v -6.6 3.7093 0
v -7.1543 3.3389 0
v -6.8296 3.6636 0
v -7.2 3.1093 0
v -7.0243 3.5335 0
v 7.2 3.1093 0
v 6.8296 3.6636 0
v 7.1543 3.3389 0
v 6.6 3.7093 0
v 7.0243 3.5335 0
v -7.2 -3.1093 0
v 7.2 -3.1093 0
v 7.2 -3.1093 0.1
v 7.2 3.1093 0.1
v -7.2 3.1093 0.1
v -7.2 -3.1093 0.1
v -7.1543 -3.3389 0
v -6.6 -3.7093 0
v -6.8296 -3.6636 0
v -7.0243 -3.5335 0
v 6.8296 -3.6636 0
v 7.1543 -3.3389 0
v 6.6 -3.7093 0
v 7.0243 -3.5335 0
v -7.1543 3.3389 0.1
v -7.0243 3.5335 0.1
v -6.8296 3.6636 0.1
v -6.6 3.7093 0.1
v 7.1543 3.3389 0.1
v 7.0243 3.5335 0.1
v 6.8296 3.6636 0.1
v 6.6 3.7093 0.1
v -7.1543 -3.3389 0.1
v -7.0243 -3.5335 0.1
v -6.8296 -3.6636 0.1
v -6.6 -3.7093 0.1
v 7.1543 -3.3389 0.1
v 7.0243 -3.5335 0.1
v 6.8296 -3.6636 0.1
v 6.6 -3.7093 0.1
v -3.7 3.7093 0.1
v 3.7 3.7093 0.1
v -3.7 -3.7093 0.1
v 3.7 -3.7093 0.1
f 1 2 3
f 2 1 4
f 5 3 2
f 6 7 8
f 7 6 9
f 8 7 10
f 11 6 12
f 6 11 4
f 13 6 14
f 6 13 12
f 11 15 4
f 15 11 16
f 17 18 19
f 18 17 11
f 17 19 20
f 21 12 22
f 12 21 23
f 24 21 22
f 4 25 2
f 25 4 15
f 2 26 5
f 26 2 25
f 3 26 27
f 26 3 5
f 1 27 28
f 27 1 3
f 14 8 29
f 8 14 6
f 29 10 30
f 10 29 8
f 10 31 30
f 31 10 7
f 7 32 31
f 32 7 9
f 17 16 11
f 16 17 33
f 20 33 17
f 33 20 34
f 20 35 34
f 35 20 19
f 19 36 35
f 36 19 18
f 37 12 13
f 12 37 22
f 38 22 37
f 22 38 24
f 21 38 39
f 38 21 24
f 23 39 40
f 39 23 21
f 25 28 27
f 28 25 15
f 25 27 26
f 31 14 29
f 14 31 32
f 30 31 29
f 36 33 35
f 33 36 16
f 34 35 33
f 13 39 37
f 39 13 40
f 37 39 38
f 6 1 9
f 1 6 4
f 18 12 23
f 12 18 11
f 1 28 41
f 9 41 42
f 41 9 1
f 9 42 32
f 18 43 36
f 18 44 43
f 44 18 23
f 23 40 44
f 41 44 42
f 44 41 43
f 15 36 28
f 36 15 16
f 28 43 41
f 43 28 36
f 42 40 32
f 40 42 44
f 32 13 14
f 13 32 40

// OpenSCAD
// file: ../p/box3u12.scad
use <../lib.scad>
function ldraw_lib__box3u12() = [
// 0 Box with 3 Parallel Faces without Any Edges
// 0 Name: box3u12.dat
// 0 Author: J.C. Tchang [tchang]
// 0 !LDRAW_ORG Primitive UPDATE 2014-02
// 0 !LICENSE Licensed under CC BY 2.0 and CC BY 4.0 : see CAreadme.txt
// 
// 0 BFC CERTIFY CCW
  [0,"BFC","CERTIFY"],
  [0,"BFC","CCW"],
// 
// 0 !HISTORY 2014-12-23 [PTadmin] Official Update 2014-02
// 
// 
// 4 16 -1 1 1 1 1 1 1 1 -1 -1 1 -1
  [4,16,-1,1,1,1,1,1,1,1,-1,-1,1,-1],
// 4 16 -1 1 1 -1 0 1 1 0 1 1 1 1
  [4,16,-1,1,1,-1,0,1,1,0,1,1,1,1],
// 4 16 1 1 -1 1 0 -1 -1 0 -1 -1 1 -1
  [4,16,1,1,-1,1,0,-1,-1,0,-1,-1,1,-1],
];
module ldraw_lib__box3u12(step=0, col=false, unit=2/5, alt=false, line=0.2, solid=!$preview)
    makepoly(ldraw_lib__box3u12(), step=step, col=col, unit=unit, alt=alt, line=line, solid=solid);
ldraw_lib__box3u12(line=0.2);
// file: ../p/1-4cyli.scad
use <../lib.scad>
function ldraw_lib__1_4cyli() = [
// 0 Cylinder 0.25
// 0 Name: 1-4cyli.dat
// 0 Author: James Jessiman
// 0 !LDRAW_ORG Primitive UPDATE 2012-01
// 0 !LICENSE Licensed under CC BY 2.0 and CC BY 4.0 : see CAreadme.txt
// 
// 0 BFC CERTIFY CCW
  [0,"BFC","CERTIFY"],
  [0,"BFC","CCW"],
// 
// 0 !HISTORY 2002-03-23 [sbliss] Added BFC statement.
// 0 !HISTORY 2002-04-25 [PTadmin] Official Update 2002-02
// 0 !HISTORY 2007-06-22 [PTadmin] Header formatted for Contributor Agreement
// 0 !HISTORY 2008-07-01 [PTadmin] Official Update 2008-01
// 0 !HISTORY 2012-02-16 [Philo] Changed to CCW
// 0 !HISTORY 2012-03-30 [PTadmin] Official Update 2012-01
// 
// 
// 4 16 1 1 0 0.9239 1 0.3827 0.9239 0 0.3827 1 0 0
  [4,16,1,1,0,0.9239,1,0.3827,0.9239,0,0.3827,1,0,0],
// 5 24 1 0 0 1 1 0 0.9239 0 0.3827 1 0 -1
  [5,24,1,0,0,1,1,0,0.9239,0,0.3827,1,0,-1],
// 4 16 0.9239 1 0.3827 0.7071 1 0.7071 0.7071 0 0.7071 0.9239 0 0.3827
  [4,16,0.9239,1,0.3827,0.7071,1,0.7071,0.7071,0,0.7071,0.9239,0,0.3827],
// 5 24 0.9239 0 0.3827 0.9239 1 0.3827 0.7071 0 0.7071 1 0 0
  [5,24,0.9239,0,0.3827,0.9239,1,0.3827,0.7071,0,0.7071,1,0,0],
// 4 16 0.7071 1 0.7071 0.3827 1 0.9239 0.3827 0 0.9239 0.7071 0 0.7071
  [4,16,0.7071,1,0.7071,0.3827,1,0.9239,0.3827,0,0.9239,0.7071,0,0.7071],
// 5 24 0.7071 0 0.7071 0.7071 1 0.7071 0.3827 0 0.9239 0.9239 0 0.3827
  [5,24,0.7071,0,0.7071,0.7071,1,0.7071,0.3827,0,0.9239,0.9239,0,0.3827],
// 4 16 0.3827 1 0.9239 0 1 1 0 0 1 0.3827 0 0.9239
  [4,16,0.3827,1,0.9239,0,1,1,0,0,1,0.3827,0,0.9239],
// 5 24 0.3827 0 0.9239 0.3827 1 0.9239 0 0 1 0.7071 0 0.7071
  [5,24,0.3827,0,0.9239,0.3827,1,0.9239,0,0,1,0.7071,0,0.7071],
// 5 24 0 0 1 0 1 1 0.3827 0 0.9239 -1 0 1
  [5,24,0,0,1,0,1,1,0.3827,0,0.9239,-1,0,1],
];
module ldraw_lib__1_4cyli(step=0, col=false, unit=2/5, alt=false, line=0.2, solid=!$preview)
    makepoly(ldraw_lib__1_4cyli(), step=step, col=col, unit=unit, alt=alt, line=line, solid=solid);
ldraw_lib__1_4cyli(line=0.2);
// file: ../p/1-4chrd.scad
use <../lib.scad>
function ldraw_lib__1_4chrd() = [
// 0 Chord 0.25
// 0 Name: 1-4chrd.dat
// 0 Author: Tony Hafner [hafhead]
// 0 !LDRAW_ORG Primitive UPDATE 2012-02
// 0 !LICENSE Licensed under CC BY 2.0 and CC BY 4.0 : see CAreadme.txt
// 
// 0 BFC CERTIFY CCW
  [0,"BFC","CERTIFY"],
  [0,"BFC","CCW"],
// 
// 0 !HISTORY 2004-04-22 [PTadmin] Official Update 2004-02
// 0 !HISTORY 2007-10-09 [PTadmin] Header formatted for Contributor Agreement
// 0 !HISTORY 2008-07-01 [PTadmin] Official Update 2008-01
// 0 !HISTORY 2012-08-02 [MMR1988] Re-creation with PrimGen2 and Rectifier
// 0 !HISTORY 2012-08-09 [PTadmin] Official Update 2012-02
// 
// 
// 4 16 0.9239 0 0.3827 0.3827 0 0.9239 0 0 1 1 0 0
  [4,16,0.9239,0,0.3827,0.3827,0,0.9239,0,0,1,1,0,0],
// 3 16 0.7071 0 0.7071 0.3827 0 0.9239 0.9239 0 0.3827
  [3,16,0.7071,0,0.7071,0.3827,0,0.9239,0.9239,0,0.3827],
];
module ldraw_lib__1_4chrd(step=0, col=false, unit=2/5, alt=false, line=0.2, solid=!$preview)
    makepoly(ldraw_lib__1_4chrd(), step=step, col=col, unit=unit, alt=alt, line=line, solid=solid);
ldraw_lib__1_4chrd(line=0.2);
// main file
use <../lib.scad>
use <../p/1-4chrd.scad>
use <../p/1-4cyli.scad>
use <../p/box3u12.scad>
function ldraw_lib__6142617c() = [
// 0 Sticker  0.9 x  1.8 with Black Stripe on White Background
// 0 Name: 6142617c.dat
// 0 Author: Massimo Maso [Sirio]
// 0 !LDRAW_ORG Part UPDATE 2022-04
// 0 !LICENSE Licensed under CC BY 2.0 and CC BY 4.0 : see CAreadme.txt
// 
// 0 BFC CERTIFY CCW
  [0,"BFC","CERTIFY"],
  [0,"BFC","CCW"],
// 
// 0 !KEYWORDS 1969, Camaro, Chevrolet, Drag, Race, Set 75874, Speed Champions
// 0 !KEYWORDS Z/28
// 
// 0 !HISTORY 2022-07-18 [PTadmin] Official Update 2022-04
// 
// 
// 0 // Primitives
// 
// 1 16 -16.5 0 7.7732 -1.5 0 0 0 -1 0 0 0 1.5 1-4chrd.dat
  [1,16,-16.5,0,7.7732,-1.5,0,0,0,-1,0,0,0,1.5, ldraw_lib__1_4chrd()],
// 1 16 16.5 0 7.7732 1.5 0 0 0 -1 0 0 0 1.5 1-4chrd.dat
  [1,16,16.5,0,7.7732,1.5,0,0,0,-1,0,0,0,1.5, ldraw_lib__1_4chrd()],
// 1 16 0 -.25 0 0 0 18 0 .25 0 7.7732 0 0 box3u12.dat
  [1,16,0,-.25,0,0,0,18,0,.25,0,7.7732,0,0, ldraw_lib__box3u12()],
// 1 16 -16.5 0 -7.7732 -1.5 0 0 0 -1 0 0 0 -1.5 1-4chrd.dat
  [1,16,-16.5,0,-7.7732,-1.5,0,0,0,-1,0,0,0,-1.5, ldraw_lib__1_4chrd()],
// 1 16 16.5 0 -7.7732 1.5 0 0 0 -1 0 0 0 -1.5 1-4chrd.dat
  [1,16,16.5,0,-7.7732,1.5,0,0,0,-1,0,0,0,-1.5, ldraw_lib__1_4chrd()],
// 1 16 -16.5 0 7.7732 -1.5 0 0 0 -.25 0 0 0 1.5 1-4cyli.dat
  [1,16,-16.5,0,7.7732,-1.5,0,0,0,-.25,0,0,0,1.5, ldraw_lib__1_4cyli()],
// 1 16 16.5 0 7.7732 1.5 0 0 0 -.25 0 0 0 1.5 1-4cyli.dat
  [1,16,16.5,0,7.7732,1.5,0,0,0,-.25,0,0,0,1.5, ldraw_lib__1_4cyli()],
// 1 16 -16.5 0 -7.7732 -1.5 0 0 0 -.25 0 0 0 -1.5 1-4cyli.dat
  [1,16,-16.5,0,-7.7732,-1.5,0,0,0,-.25,0,0,0,-1.5, ldraw_lib__1_4cyli()],
// 1 16 16.5 0 -7.7732 1.5 0 0 0 -.25 0 0 0 -1.5 1-4cyli.dat
  [1,16,16.5,0,-7.7732,1.5,0,0,0,-.25,0,0,0,-1.5, ldraw_lib__1_4cyli()],
// 1 15 -16.5 -.25 7.7732 -1.5 0 0 0 1 0 0 0 1.5 1-4chrd.dat
  [1,15,-16.5,-.25,7.7732,-1.5,0,0,0,1,0,0,0,1.5, ldraw_lib__1_4chrd()],
// 1 15 16.5 -.25 7.7732 1.5 0 0 0 1 0 0 0 1.5 1-4chrd.dat
  [1,15,16.5,-.25,7.7732,1.5,0,0,0,1,0,0,0,1.5, ldraw_lib__1_4chrd()],
// 1 15 -16.5 -.25 -7.7732 -1.5 0 0 0 1 0 0 0 -1.5 1-4chrd.dat
  [1,15,-16.5,-.25,-7.7732,-1.5,0,0,0,1,0,0,0,-1.5, ldraw_lib__1_4chrd()],
// 1 15 16.5 -.25 -7.7732 1.5 0 0 0 1 0 0 0 -1.5 1-4chrd.dat
  [1,15,16.5,-.25,-7.7732,1.5,0,0,0,1,0,0,0,-1.5, ldraw_lib__1_4chrd()],
// 0 // Bottom face
// 4 16 16.5 0 9.2732 18 0 7.7732 -18 0 7.7732 -16.5 0 9.2732
  [4,16,16.5,0,9.2732,18,0,7.7732,-18,0,7.7732,-16.5,0,9.2732],
// 4 16 16.5 0 -9.2732 -16.5 0 -9.2732 -18 0 -7.7732 18 0 -7.7732
  [4,16,16.5,0,-9.2732,-16.5,0,-9.2732,-18,0,-7.7732,18,0,-7.7732],
// 0 // Lateral face
// 3 16 -16.5 0 9.2732 -16.5 -.25 9.2732 -9.25 -.25 9.2732
  [3,16,-16.5,0,9.2732,-16.5,-.25,9.2732,-9.25,-.25,9.2732],
// 4 16 -16.5 0 9.2732 -9.25 -.25 9.2732 9.25 -.25 9.2732 16.5 0 9.2732
  [4,16,-16.5,0,9.2732,-9.25,-.25,9.2732,9.25,-.25,9.2732,16.5,0,9.2732],
// 3 16 16.5 0 9.2732 9.25 -.25 9.2732 16.5 -.25 9.2732
  [3,16,16.5,0,9.2732,9.25,-.25,9.2732,16.5,-.25,9.2732],
// 3 16 -16.5 0 -9.2732 -9.25 -.25 -9.2732 -16.5 -.25 -9.2732
  [3,16,-16.5,0,-9.2732,-9.25,-.25,-9.2732,-16.5,-.25,-9.2732],
// 4 16 -16.5 0 -9.2732 16.5 0 -9.2732 9.25 -.25 -9.2732 -9.25 -.25 -9.2732
  [4,16,-16.5,0,-9.2732,16.5,0,-9.2732,9.25,-.25,-9.2732,-9.25,-.25,-9.2732],
// 3 16 16.5 0 -9.2732 16.5 -.25 -9.2732 9.25 -.25 -9.2732
  [3,16,16.5,0,-9.2732,16.5,-.25,-9.2732,9.25,-.25,-9.2732],
// 0 // Top face
// 0 // Black face
// 4 0 -9.25 -.25 9.2732 -9.25 -.25 -9.2732 9.25 -.25 -9.2732 9.25 -.25 9.2732
  [4,0,-9.25,-.25,9.2732,-9.25,-.25,-9.2732,9.25,-.25,-9.2732,9.25,-.25,9.2732],
// 0 // White faces
// 4 15 -16.5 -.25 9.2732 -18 -.25 7.7732 -18 -.25 -7.7732 -16.5 -.25 -9.2732
  [4,15,-16.5,-.25,9.2732,-18,-.25,7.7732,-18,-.25,-7.7732,-16.5,-.25,-9.2732],
// 4 15 -16.5 -.25 9.2732 -16.5 -.25 -9.2732 -9.25 -.25 -9.2732 -9.25 -.25 9.2732
  [4,15,-16.5,-.25,9.2732,-16.5,-.25,-9.2732,-9.25,-.25,-9.2732,-9.25,-.25,9.2732],
// 4 15 16.5 -.25 9.2732 9.25 -.25 9.2732 9.25 -.25 -9.2732 16.5 -.25 -9.2732
  [4,15,16.5,-.25,9.2732,9.25,-.25,9.2732,9.25,-.25,-9.2732,16.5,-.25,-9.2732],
// 4 15 16.5 -.25 9.2732 16.5 -.25 -9.2732 18 -.25 -7.7732 18 -.25 7.7732
  [4,15,16.5,-.25,9.2732,16.5,-.25,-9.2732,18,-.25,-7.7732,18,-.25,7.7732],
];
module ldraw_lib__6142617c(step=0, col=false, unit=2/5, alt=false, line=0.2, solid=!$preview)
    makepoly(ldraw_lib__6142617c(), step=step, col=col, unit=unit, alt=alt, line=line, solid=solid);
ldraw_lib__6142617c(line=0.2);
